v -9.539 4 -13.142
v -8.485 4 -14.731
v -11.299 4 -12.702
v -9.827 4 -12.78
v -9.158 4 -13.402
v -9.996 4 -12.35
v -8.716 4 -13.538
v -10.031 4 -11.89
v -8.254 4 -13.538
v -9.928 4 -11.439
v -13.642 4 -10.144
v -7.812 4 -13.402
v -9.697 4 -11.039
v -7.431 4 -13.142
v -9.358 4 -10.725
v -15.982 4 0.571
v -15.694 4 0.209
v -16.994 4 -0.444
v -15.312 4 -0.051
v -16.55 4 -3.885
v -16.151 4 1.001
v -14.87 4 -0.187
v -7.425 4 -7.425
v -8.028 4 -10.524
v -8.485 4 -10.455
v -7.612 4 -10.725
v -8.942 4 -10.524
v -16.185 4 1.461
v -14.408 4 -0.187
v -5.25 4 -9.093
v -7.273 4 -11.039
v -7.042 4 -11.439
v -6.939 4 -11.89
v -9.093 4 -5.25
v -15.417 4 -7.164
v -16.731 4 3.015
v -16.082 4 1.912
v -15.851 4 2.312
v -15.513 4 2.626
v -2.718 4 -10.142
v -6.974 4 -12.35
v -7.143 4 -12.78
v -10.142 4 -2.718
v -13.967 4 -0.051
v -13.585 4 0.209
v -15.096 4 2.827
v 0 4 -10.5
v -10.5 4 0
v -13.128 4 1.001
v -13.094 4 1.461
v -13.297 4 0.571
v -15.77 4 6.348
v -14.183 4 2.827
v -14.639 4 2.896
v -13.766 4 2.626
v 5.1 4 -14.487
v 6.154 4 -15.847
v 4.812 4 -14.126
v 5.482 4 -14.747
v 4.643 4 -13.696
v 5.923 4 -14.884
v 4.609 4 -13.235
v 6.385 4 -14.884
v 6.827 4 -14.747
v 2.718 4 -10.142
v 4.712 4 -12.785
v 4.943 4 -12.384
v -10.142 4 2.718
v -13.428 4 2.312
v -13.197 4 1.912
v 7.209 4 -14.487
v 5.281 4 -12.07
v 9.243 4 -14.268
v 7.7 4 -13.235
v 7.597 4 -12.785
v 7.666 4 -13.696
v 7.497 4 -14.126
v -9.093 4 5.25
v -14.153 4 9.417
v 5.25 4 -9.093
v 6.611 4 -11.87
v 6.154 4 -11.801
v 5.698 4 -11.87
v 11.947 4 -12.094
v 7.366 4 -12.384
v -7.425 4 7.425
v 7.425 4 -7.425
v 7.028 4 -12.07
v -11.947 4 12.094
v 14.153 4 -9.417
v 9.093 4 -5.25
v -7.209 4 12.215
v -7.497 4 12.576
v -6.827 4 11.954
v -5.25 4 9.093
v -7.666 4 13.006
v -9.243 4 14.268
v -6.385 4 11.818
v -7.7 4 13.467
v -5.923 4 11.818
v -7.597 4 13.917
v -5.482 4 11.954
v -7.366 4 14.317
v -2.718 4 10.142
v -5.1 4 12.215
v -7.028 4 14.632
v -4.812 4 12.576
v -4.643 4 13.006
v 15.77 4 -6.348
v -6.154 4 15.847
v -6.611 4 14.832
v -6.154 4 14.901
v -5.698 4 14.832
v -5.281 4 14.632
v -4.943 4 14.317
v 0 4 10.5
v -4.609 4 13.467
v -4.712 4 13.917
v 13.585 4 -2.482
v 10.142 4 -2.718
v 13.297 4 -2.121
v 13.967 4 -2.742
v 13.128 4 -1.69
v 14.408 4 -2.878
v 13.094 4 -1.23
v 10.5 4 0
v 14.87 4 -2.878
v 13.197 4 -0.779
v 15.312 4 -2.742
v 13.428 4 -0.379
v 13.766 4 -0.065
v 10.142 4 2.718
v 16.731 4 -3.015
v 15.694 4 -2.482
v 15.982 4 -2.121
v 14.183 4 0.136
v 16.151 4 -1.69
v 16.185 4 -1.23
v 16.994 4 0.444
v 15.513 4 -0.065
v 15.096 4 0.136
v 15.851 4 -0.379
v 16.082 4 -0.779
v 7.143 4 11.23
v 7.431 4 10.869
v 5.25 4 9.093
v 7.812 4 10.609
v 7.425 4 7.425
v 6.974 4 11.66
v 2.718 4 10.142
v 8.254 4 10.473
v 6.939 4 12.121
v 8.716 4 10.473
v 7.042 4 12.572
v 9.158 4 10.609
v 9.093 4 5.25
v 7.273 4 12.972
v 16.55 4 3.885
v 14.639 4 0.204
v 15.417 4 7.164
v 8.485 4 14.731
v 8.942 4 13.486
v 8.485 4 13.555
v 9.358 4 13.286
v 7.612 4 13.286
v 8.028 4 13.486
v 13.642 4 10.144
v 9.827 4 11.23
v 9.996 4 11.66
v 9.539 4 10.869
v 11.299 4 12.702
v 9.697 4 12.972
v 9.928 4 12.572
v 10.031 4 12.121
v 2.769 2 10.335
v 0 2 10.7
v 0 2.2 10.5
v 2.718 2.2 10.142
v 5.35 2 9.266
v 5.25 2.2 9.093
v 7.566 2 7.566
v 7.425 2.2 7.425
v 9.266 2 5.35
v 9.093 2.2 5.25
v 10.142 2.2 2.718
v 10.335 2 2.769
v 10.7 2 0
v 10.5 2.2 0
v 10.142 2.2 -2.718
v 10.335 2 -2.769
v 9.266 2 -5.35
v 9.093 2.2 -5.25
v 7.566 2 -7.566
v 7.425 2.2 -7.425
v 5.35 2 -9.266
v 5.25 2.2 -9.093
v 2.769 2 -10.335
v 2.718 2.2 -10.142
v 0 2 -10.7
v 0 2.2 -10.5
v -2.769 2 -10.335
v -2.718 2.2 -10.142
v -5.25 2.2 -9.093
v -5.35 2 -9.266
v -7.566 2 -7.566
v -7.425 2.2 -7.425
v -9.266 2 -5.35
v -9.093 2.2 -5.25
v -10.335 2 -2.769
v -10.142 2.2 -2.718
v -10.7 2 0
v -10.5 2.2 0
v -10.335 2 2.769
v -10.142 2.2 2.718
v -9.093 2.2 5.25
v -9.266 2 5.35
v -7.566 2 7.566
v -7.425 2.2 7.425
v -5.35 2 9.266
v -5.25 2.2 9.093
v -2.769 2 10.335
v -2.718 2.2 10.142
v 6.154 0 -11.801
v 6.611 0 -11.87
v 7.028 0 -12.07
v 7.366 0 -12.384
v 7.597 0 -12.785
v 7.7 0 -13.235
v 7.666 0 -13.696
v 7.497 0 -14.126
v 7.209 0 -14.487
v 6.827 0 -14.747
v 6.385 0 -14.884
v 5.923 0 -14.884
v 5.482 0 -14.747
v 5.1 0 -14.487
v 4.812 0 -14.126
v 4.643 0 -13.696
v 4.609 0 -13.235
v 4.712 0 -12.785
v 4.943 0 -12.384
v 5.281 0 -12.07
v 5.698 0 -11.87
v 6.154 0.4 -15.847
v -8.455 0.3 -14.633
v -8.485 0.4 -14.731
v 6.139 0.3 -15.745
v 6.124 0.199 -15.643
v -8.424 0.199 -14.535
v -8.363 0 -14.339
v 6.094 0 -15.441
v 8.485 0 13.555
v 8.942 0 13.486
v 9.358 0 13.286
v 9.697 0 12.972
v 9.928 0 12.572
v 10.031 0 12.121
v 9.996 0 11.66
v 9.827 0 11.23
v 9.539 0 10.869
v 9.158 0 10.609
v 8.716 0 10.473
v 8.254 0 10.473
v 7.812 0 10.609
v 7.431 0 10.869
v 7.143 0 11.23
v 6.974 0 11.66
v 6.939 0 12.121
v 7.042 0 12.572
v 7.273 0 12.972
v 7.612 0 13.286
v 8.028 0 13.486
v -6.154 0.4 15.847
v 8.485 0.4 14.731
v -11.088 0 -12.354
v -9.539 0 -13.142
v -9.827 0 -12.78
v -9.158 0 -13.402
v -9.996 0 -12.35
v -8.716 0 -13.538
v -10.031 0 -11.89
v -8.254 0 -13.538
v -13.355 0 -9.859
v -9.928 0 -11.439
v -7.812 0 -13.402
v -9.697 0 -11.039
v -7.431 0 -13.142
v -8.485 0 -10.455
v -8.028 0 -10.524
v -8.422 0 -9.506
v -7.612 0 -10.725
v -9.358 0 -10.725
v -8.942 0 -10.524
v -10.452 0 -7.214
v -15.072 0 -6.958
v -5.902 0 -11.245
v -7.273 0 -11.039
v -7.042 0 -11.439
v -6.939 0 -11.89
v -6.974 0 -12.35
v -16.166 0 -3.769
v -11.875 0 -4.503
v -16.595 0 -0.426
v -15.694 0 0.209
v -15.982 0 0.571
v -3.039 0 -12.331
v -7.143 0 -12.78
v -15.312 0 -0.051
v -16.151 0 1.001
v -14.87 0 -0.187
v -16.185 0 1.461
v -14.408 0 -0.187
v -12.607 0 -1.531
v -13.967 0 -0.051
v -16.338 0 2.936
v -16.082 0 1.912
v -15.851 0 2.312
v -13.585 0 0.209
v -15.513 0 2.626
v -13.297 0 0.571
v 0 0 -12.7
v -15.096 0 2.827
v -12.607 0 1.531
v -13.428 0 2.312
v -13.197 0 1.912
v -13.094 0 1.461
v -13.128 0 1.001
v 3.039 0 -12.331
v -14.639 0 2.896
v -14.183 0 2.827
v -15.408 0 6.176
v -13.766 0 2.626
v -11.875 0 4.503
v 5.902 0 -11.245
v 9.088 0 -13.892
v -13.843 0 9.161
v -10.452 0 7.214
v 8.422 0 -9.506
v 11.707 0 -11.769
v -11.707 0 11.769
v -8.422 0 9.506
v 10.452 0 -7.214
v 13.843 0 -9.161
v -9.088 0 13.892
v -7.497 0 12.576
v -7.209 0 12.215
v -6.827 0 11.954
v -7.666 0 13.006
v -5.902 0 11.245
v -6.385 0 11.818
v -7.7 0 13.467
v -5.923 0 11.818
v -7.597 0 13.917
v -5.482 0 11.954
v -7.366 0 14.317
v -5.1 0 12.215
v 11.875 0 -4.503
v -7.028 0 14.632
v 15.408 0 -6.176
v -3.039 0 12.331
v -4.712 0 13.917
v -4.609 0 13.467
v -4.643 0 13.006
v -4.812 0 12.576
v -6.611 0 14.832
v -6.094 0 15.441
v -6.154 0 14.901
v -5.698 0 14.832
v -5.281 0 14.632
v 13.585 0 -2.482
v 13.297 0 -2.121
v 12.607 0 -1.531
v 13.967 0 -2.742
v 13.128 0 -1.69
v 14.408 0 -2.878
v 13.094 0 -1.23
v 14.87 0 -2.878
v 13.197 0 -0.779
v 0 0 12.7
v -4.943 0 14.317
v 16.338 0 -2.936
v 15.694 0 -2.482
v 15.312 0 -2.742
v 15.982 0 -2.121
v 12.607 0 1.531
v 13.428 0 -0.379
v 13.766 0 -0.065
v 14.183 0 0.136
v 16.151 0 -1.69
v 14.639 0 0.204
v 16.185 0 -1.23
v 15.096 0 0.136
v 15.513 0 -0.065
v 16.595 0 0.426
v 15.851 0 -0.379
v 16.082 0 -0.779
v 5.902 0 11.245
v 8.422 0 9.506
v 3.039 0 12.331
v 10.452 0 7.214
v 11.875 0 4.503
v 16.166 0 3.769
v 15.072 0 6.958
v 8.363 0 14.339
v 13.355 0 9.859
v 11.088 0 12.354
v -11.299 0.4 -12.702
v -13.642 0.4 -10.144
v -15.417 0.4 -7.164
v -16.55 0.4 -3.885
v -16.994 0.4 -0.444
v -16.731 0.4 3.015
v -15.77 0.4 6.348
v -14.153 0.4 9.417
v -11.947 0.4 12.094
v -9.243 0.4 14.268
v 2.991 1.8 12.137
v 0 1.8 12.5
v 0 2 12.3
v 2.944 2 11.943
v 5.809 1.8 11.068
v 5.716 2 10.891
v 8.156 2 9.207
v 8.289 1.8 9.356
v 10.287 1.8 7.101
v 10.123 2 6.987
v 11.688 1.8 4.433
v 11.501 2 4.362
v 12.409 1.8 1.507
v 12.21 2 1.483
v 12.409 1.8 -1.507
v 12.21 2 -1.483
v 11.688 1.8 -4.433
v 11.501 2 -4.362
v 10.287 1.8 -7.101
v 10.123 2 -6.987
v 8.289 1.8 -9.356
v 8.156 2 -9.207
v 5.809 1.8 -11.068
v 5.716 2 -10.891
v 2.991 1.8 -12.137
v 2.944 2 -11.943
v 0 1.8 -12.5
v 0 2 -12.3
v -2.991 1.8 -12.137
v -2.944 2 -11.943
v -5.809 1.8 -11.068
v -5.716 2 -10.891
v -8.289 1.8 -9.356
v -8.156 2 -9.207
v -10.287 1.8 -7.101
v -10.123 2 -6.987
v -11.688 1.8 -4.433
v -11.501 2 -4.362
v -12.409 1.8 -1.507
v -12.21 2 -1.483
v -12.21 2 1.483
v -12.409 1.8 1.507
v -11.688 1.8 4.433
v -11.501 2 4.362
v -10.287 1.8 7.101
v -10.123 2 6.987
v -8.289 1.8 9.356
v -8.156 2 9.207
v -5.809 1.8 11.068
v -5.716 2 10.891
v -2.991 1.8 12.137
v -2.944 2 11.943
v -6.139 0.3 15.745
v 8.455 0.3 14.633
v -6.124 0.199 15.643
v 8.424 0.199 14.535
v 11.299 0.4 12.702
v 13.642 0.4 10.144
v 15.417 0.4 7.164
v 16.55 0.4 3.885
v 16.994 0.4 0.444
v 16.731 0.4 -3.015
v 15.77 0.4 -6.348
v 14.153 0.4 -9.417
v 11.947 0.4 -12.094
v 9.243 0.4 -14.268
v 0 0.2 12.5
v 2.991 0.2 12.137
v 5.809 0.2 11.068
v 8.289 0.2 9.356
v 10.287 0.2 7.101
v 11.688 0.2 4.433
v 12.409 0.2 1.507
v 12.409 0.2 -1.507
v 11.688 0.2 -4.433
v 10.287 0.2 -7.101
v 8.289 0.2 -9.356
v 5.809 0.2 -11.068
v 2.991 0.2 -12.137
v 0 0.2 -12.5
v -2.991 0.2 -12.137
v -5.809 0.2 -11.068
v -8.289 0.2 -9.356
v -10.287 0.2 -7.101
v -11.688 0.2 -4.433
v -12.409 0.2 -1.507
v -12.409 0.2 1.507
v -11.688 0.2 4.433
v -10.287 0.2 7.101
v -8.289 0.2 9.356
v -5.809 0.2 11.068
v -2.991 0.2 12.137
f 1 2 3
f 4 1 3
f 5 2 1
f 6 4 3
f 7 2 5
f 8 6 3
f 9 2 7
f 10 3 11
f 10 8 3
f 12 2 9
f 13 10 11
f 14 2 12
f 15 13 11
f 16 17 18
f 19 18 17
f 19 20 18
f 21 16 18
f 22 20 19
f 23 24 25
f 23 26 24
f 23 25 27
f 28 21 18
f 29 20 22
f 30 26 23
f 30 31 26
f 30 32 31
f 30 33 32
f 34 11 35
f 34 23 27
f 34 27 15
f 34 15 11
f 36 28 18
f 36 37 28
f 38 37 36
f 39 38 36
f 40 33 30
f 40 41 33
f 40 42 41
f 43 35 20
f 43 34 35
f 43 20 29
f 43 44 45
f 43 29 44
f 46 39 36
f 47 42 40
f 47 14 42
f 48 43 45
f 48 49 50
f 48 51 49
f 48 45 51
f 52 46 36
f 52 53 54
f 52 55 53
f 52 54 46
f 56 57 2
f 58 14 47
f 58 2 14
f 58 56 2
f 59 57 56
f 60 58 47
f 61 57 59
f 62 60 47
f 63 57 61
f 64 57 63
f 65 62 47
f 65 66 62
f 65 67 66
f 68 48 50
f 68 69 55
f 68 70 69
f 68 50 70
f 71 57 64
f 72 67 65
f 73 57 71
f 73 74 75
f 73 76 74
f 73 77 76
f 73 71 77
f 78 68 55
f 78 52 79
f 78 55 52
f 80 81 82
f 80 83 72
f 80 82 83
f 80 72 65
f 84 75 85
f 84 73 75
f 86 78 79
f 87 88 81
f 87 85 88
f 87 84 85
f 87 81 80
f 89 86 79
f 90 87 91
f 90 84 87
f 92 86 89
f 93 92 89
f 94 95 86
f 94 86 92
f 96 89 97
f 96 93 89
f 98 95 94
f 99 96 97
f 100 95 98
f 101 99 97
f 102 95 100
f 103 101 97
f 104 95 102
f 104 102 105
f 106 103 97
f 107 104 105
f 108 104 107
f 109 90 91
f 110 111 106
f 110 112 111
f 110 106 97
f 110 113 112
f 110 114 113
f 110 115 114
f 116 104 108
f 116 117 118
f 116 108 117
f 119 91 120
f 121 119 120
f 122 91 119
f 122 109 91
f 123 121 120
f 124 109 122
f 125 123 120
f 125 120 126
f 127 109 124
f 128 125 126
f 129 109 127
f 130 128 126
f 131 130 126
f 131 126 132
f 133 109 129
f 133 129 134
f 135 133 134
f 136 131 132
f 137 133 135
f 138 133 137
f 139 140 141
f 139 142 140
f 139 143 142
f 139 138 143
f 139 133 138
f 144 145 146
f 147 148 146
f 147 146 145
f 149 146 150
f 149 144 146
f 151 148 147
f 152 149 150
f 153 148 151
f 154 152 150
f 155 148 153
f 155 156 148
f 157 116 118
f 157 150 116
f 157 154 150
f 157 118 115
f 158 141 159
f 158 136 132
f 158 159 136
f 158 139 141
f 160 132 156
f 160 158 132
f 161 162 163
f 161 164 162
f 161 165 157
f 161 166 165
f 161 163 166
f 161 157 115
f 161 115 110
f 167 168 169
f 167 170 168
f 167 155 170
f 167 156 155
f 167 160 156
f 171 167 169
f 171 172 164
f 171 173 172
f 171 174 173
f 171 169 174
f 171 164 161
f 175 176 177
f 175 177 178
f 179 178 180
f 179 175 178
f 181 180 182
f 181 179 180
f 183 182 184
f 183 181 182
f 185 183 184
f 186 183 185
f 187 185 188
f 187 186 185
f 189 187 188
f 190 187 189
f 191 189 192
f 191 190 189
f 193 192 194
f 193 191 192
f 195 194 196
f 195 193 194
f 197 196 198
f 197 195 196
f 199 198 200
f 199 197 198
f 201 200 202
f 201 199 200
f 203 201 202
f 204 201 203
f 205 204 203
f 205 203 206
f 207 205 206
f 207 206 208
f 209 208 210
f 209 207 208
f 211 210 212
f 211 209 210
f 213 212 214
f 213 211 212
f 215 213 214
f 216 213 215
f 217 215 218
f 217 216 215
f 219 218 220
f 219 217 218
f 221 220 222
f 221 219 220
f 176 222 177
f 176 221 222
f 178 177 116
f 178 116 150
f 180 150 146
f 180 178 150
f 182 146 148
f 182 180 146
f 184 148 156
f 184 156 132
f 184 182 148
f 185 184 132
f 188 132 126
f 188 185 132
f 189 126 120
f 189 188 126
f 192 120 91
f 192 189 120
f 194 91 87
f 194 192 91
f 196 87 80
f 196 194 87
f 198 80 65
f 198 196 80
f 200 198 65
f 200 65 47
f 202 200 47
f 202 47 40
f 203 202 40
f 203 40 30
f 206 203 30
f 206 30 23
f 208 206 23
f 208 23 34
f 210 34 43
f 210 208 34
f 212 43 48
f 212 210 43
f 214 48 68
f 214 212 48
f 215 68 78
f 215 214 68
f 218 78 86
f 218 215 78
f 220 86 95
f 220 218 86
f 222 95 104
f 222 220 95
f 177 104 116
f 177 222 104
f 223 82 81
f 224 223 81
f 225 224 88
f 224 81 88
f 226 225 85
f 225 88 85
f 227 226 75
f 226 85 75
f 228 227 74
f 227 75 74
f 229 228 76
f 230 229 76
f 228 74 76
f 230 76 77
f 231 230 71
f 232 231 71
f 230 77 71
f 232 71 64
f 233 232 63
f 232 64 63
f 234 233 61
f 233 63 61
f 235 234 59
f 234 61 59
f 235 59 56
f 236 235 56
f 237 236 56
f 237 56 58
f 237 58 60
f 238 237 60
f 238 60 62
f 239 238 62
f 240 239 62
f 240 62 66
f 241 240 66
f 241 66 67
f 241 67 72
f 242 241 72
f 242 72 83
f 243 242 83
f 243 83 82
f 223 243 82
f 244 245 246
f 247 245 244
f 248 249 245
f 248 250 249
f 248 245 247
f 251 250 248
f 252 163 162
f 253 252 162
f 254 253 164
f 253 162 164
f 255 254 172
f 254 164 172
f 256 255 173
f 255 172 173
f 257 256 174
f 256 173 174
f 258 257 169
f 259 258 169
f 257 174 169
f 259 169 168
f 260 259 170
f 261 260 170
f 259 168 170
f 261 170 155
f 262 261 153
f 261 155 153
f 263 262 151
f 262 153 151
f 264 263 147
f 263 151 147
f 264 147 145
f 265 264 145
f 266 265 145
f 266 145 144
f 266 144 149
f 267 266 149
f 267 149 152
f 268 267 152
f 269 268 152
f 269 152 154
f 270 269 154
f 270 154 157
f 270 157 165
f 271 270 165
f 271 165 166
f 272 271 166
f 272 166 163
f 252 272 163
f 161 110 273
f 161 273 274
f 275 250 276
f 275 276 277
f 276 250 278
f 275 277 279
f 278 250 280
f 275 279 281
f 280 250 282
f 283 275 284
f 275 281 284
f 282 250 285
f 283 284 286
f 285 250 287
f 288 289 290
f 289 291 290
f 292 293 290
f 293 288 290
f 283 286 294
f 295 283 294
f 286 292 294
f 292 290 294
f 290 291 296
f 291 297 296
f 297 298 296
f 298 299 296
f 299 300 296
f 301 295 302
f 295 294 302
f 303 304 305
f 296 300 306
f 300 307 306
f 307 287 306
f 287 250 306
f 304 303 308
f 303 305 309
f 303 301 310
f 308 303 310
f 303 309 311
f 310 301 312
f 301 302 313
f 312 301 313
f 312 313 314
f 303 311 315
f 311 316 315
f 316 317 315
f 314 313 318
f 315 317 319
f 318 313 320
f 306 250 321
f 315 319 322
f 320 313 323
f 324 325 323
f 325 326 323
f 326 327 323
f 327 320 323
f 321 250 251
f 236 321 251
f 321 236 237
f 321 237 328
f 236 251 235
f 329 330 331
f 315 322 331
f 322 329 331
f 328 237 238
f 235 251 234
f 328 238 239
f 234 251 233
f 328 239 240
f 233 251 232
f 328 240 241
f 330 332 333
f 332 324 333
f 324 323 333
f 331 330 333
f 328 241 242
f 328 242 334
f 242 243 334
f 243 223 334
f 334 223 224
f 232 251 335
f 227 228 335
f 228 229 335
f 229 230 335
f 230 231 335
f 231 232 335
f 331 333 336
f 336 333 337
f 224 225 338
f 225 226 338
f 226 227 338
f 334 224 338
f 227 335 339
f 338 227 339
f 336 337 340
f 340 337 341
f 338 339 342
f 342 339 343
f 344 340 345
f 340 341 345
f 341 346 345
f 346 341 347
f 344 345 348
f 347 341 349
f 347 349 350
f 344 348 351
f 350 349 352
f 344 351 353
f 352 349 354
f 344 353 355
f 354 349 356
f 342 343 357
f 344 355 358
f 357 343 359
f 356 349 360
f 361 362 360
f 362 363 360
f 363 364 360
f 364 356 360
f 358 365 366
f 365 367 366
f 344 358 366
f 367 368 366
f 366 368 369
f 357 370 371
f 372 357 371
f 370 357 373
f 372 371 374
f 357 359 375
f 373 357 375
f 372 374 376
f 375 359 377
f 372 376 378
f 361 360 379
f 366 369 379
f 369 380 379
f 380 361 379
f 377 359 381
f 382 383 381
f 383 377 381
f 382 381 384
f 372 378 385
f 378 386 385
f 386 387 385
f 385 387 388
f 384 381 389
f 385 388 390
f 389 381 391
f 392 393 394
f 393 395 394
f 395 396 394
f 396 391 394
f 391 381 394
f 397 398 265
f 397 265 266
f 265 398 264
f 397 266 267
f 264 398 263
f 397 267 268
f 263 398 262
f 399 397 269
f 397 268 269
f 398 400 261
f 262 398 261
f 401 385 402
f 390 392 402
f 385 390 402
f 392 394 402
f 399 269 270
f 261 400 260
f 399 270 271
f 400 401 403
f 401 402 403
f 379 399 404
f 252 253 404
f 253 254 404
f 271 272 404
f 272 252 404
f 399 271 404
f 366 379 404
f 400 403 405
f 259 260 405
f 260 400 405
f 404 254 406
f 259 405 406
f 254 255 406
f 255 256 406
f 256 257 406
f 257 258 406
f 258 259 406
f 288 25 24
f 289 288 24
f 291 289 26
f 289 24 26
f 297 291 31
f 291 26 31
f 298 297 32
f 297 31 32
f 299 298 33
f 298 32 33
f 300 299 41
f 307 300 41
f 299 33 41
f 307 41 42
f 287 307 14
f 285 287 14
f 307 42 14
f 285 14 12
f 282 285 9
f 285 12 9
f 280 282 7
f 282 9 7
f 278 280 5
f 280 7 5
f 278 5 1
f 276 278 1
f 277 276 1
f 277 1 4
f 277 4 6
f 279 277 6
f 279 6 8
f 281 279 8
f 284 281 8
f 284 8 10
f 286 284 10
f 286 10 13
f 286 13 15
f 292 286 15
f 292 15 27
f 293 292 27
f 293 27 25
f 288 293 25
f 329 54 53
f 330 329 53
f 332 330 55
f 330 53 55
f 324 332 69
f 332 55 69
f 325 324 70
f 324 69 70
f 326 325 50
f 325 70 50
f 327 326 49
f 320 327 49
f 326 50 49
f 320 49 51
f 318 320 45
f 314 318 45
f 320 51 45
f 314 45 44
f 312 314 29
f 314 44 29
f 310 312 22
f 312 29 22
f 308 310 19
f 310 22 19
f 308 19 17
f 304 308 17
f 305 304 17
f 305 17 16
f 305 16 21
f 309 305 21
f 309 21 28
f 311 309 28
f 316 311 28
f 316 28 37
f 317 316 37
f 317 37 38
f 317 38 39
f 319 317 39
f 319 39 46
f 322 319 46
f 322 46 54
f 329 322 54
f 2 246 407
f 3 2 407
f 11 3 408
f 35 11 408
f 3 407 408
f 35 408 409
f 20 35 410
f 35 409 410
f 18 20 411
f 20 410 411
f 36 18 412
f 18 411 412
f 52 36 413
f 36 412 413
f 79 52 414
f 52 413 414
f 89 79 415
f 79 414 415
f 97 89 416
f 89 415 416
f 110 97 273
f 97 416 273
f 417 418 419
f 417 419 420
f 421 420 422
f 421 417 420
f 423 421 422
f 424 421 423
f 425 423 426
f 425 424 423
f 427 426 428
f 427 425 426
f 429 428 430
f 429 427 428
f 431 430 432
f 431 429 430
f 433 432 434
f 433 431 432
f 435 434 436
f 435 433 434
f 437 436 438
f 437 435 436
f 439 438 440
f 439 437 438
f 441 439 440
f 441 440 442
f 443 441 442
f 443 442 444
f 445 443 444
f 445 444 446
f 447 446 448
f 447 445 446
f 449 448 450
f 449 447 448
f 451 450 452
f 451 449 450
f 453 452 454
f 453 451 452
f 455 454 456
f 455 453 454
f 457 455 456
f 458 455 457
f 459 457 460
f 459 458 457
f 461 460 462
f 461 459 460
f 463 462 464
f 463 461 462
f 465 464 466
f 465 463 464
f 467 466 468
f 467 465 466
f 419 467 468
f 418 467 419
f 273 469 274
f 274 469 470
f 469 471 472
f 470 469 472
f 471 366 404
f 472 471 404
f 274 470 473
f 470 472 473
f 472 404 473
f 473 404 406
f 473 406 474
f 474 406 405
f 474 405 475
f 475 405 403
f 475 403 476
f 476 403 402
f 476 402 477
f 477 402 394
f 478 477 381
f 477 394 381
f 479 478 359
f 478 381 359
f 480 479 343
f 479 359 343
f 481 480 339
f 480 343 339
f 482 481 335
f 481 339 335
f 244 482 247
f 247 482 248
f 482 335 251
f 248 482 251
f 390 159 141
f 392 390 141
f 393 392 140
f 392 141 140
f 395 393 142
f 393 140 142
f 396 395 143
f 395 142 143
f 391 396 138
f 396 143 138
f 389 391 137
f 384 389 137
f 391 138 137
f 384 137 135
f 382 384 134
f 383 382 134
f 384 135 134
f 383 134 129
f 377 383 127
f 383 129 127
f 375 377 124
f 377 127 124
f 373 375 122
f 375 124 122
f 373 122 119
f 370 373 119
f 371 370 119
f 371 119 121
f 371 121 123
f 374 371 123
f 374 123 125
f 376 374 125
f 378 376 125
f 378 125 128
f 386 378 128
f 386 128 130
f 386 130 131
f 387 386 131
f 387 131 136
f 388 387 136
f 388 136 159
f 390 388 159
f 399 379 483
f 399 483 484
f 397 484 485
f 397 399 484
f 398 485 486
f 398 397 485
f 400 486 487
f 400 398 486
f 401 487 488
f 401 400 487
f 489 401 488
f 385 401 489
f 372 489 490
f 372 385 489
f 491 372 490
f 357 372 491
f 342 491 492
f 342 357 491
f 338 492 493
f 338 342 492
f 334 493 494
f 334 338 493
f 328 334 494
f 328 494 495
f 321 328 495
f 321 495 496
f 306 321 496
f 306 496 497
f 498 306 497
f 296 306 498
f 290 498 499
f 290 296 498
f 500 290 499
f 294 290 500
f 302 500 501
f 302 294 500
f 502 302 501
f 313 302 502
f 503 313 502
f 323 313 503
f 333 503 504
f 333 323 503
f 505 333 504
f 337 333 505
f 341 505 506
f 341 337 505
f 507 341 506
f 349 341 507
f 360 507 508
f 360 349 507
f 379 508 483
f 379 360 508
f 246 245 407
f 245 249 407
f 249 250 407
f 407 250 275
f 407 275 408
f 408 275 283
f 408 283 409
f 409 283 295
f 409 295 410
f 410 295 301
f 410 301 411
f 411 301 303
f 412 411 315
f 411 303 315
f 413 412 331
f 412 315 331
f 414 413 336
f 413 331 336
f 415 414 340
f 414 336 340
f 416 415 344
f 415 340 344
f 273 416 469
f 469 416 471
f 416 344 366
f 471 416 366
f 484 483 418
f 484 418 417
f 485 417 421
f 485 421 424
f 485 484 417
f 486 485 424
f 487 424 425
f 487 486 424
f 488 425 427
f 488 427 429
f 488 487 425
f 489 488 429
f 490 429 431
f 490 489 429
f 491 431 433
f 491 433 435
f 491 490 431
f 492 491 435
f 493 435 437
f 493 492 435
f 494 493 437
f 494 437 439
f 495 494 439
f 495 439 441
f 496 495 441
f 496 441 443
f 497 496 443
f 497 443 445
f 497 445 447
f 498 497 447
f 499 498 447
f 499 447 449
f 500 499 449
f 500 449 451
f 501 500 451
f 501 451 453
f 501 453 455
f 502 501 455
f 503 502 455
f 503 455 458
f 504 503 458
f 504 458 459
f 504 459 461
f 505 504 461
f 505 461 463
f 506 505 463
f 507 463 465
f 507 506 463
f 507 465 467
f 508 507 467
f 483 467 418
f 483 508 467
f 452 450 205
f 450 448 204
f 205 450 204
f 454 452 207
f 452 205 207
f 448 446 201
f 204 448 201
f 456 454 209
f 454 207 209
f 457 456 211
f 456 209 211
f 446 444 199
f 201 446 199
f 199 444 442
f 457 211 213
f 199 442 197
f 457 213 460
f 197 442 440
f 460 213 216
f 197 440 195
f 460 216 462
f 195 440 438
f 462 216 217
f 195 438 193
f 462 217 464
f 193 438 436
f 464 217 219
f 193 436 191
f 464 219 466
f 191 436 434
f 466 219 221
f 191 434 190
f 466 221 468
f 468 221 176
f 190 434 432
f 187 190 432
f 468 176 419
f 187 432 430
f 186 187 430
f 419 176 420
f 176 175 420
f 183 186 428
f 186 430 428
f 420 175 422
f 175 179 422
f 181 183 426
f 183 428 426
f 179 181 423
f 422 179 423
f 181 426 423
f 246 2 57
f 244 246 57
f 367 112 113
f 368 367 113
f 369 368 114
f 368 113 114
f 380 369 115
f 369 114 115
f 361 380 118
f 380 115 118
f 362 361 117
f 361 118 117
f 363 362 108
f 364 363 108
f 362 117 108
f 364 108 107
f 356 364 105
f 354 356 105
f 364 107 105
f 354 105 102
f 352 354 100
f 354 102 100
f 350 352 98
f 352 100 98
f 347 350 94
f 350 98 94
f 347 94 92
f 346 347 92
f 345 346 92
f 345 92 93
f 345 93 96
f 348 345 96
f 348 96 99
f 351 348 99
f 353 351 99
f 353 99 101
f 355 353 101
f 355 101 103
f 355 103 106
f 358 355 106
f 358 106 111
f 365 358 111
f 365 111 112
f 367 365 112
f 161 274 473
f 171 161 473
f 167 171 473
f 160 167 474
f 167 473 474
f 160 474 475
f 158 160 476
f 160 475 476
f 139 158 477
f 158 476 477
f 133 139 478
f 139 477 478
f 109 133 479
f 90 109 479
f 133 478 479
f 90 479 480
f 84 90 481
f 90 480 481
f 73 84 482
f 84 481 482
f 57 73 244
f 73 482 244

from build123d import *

# Parameters (mm, degrees)
SKETCH1_R           = 17
SKETCH1_R_2         = 12.5
BOSS_EXTRUDE1_DEPTH = 4
SKETCH2_R           = 1.55
CUT_EXTRUDE1_DEPTH  = 25.372115214
BOSS_EXTRUDE2_START = -2
SKETCH3_R           = 12.5
SKETCH3_R_2         = 10.5
BOSS_EXTRUDE2_DEPTH = 2
CHAMFER1_SIZE       = 0.2
CHAMFER2_SIZE       = 0.4


with BuildPart() as part:
    # Sketch1 → Boss-Extrude1 (new body)
    with BuildSketch(Plane(origin=(0, 0, 0), x_dir=(1, 0, 0), z_dir=(0, 1, 0))):
        with Locations(Location((0, 0, 0), (0, 0, 270))):
            Circle(SKETCH1_R)
        with Locations(Location((0, 0, 0), (0, 0, 270))):
            Circle(SKETCH1_R_2, mode=Mode.SUBTRACT)
    extrude(amount=BOSS_EXTRUDE1_DEPTH)

    # Sketch2 → Cut-Extrude1 (cut, through all)
    with BuildSketch(Plane(origin=(0, 4, 0), x_dir=(1, 0, 0), z_dir=(0, 1, 0))):
        with Locations(Location((-8.485, 12.005347771, 0), (0, 0, 270))):
            Circle(SKETCH2_R)
        with Locations(Location((6.154436151, 13.350899437, 0), (0, 0, 270))):
            Circle(SKETCH2_R)
        with Locations(Location((14.639436151, 1.345551666, 0), (0, 0, 270))):
            Circle(SKETCH2_R)
        with Locations(Location((8.485, -12.005347771, 0), (0, 0, 270))):
            Circle(SKETCH2_R)
        with Locations(Location((-6.154436151, -13.350899437, 0), (0, 0, 270))):
            Circle(SKETCH2_R)
        with Locations(Location((-14.639436151, -1.345551666, 0), (0, 0, 270))):
            Circle(SKETCH2_R)
        Polygon((-8.485, 14.731081936), (6.154436151, 15.846858227), (5.945678869, 18.585838188), (-8.485, 17.485972785), align=None)
        Polygon((8.485, -14.731081936), (8.693757282, -17.470061897), (-5.736921587, -18.5699273), (-6.154436151, -15.846858227), align=None)
    extrude(amount=-CUT_EXTRUDE1_DEPTH, mode=Mode.SUBTRACT)

    # Sketch3 → Boss-Extrude2 (add)
    with BuildSketch(Plane(origin=(0, 4, 0), x_dir=(1, 0, 0), z_dir=(0, 1, 0)).offset(BOSS_EXTRUDE2_START)):
        with Locations(Location((0, 0, 0), (0, 0, 270))):
            Circle(SKETCH3_R)
        with Locations(Location((0, 0, 0), (0, 0, 270))):
            Circle(SKETCH3_R_2, mode=Mode.SUBTRACT)
    extrude(amount=BOSS_EXTRUDE2_DEPTH)

    # Chamfer1
    chamfer1_edges = [part.edges().sort_by_distance(p)[0] for p in [
        (0, 0, -12.5),
        (0, 2, -12.5),
        (0, 2, -10.5),
    ]]
    chamfer(chamfer1_edges, length=CHAMFER1_SIZE)

    # Chamfer2
    chamfer2_edges = [part.edges().sort_by_distance(p)[0] for p in [
        (-16.950837114, 0, 1.291944715),
        (16.950837114, 0, -1.291944715),
        (-1.165281924, 0, -15.288970081),
        (1.165281924, 0, 15.288970081),
    ]]
    chamfer(chamfer2_edges, length=CHAMFER2_SIZE)


solid = part.part
